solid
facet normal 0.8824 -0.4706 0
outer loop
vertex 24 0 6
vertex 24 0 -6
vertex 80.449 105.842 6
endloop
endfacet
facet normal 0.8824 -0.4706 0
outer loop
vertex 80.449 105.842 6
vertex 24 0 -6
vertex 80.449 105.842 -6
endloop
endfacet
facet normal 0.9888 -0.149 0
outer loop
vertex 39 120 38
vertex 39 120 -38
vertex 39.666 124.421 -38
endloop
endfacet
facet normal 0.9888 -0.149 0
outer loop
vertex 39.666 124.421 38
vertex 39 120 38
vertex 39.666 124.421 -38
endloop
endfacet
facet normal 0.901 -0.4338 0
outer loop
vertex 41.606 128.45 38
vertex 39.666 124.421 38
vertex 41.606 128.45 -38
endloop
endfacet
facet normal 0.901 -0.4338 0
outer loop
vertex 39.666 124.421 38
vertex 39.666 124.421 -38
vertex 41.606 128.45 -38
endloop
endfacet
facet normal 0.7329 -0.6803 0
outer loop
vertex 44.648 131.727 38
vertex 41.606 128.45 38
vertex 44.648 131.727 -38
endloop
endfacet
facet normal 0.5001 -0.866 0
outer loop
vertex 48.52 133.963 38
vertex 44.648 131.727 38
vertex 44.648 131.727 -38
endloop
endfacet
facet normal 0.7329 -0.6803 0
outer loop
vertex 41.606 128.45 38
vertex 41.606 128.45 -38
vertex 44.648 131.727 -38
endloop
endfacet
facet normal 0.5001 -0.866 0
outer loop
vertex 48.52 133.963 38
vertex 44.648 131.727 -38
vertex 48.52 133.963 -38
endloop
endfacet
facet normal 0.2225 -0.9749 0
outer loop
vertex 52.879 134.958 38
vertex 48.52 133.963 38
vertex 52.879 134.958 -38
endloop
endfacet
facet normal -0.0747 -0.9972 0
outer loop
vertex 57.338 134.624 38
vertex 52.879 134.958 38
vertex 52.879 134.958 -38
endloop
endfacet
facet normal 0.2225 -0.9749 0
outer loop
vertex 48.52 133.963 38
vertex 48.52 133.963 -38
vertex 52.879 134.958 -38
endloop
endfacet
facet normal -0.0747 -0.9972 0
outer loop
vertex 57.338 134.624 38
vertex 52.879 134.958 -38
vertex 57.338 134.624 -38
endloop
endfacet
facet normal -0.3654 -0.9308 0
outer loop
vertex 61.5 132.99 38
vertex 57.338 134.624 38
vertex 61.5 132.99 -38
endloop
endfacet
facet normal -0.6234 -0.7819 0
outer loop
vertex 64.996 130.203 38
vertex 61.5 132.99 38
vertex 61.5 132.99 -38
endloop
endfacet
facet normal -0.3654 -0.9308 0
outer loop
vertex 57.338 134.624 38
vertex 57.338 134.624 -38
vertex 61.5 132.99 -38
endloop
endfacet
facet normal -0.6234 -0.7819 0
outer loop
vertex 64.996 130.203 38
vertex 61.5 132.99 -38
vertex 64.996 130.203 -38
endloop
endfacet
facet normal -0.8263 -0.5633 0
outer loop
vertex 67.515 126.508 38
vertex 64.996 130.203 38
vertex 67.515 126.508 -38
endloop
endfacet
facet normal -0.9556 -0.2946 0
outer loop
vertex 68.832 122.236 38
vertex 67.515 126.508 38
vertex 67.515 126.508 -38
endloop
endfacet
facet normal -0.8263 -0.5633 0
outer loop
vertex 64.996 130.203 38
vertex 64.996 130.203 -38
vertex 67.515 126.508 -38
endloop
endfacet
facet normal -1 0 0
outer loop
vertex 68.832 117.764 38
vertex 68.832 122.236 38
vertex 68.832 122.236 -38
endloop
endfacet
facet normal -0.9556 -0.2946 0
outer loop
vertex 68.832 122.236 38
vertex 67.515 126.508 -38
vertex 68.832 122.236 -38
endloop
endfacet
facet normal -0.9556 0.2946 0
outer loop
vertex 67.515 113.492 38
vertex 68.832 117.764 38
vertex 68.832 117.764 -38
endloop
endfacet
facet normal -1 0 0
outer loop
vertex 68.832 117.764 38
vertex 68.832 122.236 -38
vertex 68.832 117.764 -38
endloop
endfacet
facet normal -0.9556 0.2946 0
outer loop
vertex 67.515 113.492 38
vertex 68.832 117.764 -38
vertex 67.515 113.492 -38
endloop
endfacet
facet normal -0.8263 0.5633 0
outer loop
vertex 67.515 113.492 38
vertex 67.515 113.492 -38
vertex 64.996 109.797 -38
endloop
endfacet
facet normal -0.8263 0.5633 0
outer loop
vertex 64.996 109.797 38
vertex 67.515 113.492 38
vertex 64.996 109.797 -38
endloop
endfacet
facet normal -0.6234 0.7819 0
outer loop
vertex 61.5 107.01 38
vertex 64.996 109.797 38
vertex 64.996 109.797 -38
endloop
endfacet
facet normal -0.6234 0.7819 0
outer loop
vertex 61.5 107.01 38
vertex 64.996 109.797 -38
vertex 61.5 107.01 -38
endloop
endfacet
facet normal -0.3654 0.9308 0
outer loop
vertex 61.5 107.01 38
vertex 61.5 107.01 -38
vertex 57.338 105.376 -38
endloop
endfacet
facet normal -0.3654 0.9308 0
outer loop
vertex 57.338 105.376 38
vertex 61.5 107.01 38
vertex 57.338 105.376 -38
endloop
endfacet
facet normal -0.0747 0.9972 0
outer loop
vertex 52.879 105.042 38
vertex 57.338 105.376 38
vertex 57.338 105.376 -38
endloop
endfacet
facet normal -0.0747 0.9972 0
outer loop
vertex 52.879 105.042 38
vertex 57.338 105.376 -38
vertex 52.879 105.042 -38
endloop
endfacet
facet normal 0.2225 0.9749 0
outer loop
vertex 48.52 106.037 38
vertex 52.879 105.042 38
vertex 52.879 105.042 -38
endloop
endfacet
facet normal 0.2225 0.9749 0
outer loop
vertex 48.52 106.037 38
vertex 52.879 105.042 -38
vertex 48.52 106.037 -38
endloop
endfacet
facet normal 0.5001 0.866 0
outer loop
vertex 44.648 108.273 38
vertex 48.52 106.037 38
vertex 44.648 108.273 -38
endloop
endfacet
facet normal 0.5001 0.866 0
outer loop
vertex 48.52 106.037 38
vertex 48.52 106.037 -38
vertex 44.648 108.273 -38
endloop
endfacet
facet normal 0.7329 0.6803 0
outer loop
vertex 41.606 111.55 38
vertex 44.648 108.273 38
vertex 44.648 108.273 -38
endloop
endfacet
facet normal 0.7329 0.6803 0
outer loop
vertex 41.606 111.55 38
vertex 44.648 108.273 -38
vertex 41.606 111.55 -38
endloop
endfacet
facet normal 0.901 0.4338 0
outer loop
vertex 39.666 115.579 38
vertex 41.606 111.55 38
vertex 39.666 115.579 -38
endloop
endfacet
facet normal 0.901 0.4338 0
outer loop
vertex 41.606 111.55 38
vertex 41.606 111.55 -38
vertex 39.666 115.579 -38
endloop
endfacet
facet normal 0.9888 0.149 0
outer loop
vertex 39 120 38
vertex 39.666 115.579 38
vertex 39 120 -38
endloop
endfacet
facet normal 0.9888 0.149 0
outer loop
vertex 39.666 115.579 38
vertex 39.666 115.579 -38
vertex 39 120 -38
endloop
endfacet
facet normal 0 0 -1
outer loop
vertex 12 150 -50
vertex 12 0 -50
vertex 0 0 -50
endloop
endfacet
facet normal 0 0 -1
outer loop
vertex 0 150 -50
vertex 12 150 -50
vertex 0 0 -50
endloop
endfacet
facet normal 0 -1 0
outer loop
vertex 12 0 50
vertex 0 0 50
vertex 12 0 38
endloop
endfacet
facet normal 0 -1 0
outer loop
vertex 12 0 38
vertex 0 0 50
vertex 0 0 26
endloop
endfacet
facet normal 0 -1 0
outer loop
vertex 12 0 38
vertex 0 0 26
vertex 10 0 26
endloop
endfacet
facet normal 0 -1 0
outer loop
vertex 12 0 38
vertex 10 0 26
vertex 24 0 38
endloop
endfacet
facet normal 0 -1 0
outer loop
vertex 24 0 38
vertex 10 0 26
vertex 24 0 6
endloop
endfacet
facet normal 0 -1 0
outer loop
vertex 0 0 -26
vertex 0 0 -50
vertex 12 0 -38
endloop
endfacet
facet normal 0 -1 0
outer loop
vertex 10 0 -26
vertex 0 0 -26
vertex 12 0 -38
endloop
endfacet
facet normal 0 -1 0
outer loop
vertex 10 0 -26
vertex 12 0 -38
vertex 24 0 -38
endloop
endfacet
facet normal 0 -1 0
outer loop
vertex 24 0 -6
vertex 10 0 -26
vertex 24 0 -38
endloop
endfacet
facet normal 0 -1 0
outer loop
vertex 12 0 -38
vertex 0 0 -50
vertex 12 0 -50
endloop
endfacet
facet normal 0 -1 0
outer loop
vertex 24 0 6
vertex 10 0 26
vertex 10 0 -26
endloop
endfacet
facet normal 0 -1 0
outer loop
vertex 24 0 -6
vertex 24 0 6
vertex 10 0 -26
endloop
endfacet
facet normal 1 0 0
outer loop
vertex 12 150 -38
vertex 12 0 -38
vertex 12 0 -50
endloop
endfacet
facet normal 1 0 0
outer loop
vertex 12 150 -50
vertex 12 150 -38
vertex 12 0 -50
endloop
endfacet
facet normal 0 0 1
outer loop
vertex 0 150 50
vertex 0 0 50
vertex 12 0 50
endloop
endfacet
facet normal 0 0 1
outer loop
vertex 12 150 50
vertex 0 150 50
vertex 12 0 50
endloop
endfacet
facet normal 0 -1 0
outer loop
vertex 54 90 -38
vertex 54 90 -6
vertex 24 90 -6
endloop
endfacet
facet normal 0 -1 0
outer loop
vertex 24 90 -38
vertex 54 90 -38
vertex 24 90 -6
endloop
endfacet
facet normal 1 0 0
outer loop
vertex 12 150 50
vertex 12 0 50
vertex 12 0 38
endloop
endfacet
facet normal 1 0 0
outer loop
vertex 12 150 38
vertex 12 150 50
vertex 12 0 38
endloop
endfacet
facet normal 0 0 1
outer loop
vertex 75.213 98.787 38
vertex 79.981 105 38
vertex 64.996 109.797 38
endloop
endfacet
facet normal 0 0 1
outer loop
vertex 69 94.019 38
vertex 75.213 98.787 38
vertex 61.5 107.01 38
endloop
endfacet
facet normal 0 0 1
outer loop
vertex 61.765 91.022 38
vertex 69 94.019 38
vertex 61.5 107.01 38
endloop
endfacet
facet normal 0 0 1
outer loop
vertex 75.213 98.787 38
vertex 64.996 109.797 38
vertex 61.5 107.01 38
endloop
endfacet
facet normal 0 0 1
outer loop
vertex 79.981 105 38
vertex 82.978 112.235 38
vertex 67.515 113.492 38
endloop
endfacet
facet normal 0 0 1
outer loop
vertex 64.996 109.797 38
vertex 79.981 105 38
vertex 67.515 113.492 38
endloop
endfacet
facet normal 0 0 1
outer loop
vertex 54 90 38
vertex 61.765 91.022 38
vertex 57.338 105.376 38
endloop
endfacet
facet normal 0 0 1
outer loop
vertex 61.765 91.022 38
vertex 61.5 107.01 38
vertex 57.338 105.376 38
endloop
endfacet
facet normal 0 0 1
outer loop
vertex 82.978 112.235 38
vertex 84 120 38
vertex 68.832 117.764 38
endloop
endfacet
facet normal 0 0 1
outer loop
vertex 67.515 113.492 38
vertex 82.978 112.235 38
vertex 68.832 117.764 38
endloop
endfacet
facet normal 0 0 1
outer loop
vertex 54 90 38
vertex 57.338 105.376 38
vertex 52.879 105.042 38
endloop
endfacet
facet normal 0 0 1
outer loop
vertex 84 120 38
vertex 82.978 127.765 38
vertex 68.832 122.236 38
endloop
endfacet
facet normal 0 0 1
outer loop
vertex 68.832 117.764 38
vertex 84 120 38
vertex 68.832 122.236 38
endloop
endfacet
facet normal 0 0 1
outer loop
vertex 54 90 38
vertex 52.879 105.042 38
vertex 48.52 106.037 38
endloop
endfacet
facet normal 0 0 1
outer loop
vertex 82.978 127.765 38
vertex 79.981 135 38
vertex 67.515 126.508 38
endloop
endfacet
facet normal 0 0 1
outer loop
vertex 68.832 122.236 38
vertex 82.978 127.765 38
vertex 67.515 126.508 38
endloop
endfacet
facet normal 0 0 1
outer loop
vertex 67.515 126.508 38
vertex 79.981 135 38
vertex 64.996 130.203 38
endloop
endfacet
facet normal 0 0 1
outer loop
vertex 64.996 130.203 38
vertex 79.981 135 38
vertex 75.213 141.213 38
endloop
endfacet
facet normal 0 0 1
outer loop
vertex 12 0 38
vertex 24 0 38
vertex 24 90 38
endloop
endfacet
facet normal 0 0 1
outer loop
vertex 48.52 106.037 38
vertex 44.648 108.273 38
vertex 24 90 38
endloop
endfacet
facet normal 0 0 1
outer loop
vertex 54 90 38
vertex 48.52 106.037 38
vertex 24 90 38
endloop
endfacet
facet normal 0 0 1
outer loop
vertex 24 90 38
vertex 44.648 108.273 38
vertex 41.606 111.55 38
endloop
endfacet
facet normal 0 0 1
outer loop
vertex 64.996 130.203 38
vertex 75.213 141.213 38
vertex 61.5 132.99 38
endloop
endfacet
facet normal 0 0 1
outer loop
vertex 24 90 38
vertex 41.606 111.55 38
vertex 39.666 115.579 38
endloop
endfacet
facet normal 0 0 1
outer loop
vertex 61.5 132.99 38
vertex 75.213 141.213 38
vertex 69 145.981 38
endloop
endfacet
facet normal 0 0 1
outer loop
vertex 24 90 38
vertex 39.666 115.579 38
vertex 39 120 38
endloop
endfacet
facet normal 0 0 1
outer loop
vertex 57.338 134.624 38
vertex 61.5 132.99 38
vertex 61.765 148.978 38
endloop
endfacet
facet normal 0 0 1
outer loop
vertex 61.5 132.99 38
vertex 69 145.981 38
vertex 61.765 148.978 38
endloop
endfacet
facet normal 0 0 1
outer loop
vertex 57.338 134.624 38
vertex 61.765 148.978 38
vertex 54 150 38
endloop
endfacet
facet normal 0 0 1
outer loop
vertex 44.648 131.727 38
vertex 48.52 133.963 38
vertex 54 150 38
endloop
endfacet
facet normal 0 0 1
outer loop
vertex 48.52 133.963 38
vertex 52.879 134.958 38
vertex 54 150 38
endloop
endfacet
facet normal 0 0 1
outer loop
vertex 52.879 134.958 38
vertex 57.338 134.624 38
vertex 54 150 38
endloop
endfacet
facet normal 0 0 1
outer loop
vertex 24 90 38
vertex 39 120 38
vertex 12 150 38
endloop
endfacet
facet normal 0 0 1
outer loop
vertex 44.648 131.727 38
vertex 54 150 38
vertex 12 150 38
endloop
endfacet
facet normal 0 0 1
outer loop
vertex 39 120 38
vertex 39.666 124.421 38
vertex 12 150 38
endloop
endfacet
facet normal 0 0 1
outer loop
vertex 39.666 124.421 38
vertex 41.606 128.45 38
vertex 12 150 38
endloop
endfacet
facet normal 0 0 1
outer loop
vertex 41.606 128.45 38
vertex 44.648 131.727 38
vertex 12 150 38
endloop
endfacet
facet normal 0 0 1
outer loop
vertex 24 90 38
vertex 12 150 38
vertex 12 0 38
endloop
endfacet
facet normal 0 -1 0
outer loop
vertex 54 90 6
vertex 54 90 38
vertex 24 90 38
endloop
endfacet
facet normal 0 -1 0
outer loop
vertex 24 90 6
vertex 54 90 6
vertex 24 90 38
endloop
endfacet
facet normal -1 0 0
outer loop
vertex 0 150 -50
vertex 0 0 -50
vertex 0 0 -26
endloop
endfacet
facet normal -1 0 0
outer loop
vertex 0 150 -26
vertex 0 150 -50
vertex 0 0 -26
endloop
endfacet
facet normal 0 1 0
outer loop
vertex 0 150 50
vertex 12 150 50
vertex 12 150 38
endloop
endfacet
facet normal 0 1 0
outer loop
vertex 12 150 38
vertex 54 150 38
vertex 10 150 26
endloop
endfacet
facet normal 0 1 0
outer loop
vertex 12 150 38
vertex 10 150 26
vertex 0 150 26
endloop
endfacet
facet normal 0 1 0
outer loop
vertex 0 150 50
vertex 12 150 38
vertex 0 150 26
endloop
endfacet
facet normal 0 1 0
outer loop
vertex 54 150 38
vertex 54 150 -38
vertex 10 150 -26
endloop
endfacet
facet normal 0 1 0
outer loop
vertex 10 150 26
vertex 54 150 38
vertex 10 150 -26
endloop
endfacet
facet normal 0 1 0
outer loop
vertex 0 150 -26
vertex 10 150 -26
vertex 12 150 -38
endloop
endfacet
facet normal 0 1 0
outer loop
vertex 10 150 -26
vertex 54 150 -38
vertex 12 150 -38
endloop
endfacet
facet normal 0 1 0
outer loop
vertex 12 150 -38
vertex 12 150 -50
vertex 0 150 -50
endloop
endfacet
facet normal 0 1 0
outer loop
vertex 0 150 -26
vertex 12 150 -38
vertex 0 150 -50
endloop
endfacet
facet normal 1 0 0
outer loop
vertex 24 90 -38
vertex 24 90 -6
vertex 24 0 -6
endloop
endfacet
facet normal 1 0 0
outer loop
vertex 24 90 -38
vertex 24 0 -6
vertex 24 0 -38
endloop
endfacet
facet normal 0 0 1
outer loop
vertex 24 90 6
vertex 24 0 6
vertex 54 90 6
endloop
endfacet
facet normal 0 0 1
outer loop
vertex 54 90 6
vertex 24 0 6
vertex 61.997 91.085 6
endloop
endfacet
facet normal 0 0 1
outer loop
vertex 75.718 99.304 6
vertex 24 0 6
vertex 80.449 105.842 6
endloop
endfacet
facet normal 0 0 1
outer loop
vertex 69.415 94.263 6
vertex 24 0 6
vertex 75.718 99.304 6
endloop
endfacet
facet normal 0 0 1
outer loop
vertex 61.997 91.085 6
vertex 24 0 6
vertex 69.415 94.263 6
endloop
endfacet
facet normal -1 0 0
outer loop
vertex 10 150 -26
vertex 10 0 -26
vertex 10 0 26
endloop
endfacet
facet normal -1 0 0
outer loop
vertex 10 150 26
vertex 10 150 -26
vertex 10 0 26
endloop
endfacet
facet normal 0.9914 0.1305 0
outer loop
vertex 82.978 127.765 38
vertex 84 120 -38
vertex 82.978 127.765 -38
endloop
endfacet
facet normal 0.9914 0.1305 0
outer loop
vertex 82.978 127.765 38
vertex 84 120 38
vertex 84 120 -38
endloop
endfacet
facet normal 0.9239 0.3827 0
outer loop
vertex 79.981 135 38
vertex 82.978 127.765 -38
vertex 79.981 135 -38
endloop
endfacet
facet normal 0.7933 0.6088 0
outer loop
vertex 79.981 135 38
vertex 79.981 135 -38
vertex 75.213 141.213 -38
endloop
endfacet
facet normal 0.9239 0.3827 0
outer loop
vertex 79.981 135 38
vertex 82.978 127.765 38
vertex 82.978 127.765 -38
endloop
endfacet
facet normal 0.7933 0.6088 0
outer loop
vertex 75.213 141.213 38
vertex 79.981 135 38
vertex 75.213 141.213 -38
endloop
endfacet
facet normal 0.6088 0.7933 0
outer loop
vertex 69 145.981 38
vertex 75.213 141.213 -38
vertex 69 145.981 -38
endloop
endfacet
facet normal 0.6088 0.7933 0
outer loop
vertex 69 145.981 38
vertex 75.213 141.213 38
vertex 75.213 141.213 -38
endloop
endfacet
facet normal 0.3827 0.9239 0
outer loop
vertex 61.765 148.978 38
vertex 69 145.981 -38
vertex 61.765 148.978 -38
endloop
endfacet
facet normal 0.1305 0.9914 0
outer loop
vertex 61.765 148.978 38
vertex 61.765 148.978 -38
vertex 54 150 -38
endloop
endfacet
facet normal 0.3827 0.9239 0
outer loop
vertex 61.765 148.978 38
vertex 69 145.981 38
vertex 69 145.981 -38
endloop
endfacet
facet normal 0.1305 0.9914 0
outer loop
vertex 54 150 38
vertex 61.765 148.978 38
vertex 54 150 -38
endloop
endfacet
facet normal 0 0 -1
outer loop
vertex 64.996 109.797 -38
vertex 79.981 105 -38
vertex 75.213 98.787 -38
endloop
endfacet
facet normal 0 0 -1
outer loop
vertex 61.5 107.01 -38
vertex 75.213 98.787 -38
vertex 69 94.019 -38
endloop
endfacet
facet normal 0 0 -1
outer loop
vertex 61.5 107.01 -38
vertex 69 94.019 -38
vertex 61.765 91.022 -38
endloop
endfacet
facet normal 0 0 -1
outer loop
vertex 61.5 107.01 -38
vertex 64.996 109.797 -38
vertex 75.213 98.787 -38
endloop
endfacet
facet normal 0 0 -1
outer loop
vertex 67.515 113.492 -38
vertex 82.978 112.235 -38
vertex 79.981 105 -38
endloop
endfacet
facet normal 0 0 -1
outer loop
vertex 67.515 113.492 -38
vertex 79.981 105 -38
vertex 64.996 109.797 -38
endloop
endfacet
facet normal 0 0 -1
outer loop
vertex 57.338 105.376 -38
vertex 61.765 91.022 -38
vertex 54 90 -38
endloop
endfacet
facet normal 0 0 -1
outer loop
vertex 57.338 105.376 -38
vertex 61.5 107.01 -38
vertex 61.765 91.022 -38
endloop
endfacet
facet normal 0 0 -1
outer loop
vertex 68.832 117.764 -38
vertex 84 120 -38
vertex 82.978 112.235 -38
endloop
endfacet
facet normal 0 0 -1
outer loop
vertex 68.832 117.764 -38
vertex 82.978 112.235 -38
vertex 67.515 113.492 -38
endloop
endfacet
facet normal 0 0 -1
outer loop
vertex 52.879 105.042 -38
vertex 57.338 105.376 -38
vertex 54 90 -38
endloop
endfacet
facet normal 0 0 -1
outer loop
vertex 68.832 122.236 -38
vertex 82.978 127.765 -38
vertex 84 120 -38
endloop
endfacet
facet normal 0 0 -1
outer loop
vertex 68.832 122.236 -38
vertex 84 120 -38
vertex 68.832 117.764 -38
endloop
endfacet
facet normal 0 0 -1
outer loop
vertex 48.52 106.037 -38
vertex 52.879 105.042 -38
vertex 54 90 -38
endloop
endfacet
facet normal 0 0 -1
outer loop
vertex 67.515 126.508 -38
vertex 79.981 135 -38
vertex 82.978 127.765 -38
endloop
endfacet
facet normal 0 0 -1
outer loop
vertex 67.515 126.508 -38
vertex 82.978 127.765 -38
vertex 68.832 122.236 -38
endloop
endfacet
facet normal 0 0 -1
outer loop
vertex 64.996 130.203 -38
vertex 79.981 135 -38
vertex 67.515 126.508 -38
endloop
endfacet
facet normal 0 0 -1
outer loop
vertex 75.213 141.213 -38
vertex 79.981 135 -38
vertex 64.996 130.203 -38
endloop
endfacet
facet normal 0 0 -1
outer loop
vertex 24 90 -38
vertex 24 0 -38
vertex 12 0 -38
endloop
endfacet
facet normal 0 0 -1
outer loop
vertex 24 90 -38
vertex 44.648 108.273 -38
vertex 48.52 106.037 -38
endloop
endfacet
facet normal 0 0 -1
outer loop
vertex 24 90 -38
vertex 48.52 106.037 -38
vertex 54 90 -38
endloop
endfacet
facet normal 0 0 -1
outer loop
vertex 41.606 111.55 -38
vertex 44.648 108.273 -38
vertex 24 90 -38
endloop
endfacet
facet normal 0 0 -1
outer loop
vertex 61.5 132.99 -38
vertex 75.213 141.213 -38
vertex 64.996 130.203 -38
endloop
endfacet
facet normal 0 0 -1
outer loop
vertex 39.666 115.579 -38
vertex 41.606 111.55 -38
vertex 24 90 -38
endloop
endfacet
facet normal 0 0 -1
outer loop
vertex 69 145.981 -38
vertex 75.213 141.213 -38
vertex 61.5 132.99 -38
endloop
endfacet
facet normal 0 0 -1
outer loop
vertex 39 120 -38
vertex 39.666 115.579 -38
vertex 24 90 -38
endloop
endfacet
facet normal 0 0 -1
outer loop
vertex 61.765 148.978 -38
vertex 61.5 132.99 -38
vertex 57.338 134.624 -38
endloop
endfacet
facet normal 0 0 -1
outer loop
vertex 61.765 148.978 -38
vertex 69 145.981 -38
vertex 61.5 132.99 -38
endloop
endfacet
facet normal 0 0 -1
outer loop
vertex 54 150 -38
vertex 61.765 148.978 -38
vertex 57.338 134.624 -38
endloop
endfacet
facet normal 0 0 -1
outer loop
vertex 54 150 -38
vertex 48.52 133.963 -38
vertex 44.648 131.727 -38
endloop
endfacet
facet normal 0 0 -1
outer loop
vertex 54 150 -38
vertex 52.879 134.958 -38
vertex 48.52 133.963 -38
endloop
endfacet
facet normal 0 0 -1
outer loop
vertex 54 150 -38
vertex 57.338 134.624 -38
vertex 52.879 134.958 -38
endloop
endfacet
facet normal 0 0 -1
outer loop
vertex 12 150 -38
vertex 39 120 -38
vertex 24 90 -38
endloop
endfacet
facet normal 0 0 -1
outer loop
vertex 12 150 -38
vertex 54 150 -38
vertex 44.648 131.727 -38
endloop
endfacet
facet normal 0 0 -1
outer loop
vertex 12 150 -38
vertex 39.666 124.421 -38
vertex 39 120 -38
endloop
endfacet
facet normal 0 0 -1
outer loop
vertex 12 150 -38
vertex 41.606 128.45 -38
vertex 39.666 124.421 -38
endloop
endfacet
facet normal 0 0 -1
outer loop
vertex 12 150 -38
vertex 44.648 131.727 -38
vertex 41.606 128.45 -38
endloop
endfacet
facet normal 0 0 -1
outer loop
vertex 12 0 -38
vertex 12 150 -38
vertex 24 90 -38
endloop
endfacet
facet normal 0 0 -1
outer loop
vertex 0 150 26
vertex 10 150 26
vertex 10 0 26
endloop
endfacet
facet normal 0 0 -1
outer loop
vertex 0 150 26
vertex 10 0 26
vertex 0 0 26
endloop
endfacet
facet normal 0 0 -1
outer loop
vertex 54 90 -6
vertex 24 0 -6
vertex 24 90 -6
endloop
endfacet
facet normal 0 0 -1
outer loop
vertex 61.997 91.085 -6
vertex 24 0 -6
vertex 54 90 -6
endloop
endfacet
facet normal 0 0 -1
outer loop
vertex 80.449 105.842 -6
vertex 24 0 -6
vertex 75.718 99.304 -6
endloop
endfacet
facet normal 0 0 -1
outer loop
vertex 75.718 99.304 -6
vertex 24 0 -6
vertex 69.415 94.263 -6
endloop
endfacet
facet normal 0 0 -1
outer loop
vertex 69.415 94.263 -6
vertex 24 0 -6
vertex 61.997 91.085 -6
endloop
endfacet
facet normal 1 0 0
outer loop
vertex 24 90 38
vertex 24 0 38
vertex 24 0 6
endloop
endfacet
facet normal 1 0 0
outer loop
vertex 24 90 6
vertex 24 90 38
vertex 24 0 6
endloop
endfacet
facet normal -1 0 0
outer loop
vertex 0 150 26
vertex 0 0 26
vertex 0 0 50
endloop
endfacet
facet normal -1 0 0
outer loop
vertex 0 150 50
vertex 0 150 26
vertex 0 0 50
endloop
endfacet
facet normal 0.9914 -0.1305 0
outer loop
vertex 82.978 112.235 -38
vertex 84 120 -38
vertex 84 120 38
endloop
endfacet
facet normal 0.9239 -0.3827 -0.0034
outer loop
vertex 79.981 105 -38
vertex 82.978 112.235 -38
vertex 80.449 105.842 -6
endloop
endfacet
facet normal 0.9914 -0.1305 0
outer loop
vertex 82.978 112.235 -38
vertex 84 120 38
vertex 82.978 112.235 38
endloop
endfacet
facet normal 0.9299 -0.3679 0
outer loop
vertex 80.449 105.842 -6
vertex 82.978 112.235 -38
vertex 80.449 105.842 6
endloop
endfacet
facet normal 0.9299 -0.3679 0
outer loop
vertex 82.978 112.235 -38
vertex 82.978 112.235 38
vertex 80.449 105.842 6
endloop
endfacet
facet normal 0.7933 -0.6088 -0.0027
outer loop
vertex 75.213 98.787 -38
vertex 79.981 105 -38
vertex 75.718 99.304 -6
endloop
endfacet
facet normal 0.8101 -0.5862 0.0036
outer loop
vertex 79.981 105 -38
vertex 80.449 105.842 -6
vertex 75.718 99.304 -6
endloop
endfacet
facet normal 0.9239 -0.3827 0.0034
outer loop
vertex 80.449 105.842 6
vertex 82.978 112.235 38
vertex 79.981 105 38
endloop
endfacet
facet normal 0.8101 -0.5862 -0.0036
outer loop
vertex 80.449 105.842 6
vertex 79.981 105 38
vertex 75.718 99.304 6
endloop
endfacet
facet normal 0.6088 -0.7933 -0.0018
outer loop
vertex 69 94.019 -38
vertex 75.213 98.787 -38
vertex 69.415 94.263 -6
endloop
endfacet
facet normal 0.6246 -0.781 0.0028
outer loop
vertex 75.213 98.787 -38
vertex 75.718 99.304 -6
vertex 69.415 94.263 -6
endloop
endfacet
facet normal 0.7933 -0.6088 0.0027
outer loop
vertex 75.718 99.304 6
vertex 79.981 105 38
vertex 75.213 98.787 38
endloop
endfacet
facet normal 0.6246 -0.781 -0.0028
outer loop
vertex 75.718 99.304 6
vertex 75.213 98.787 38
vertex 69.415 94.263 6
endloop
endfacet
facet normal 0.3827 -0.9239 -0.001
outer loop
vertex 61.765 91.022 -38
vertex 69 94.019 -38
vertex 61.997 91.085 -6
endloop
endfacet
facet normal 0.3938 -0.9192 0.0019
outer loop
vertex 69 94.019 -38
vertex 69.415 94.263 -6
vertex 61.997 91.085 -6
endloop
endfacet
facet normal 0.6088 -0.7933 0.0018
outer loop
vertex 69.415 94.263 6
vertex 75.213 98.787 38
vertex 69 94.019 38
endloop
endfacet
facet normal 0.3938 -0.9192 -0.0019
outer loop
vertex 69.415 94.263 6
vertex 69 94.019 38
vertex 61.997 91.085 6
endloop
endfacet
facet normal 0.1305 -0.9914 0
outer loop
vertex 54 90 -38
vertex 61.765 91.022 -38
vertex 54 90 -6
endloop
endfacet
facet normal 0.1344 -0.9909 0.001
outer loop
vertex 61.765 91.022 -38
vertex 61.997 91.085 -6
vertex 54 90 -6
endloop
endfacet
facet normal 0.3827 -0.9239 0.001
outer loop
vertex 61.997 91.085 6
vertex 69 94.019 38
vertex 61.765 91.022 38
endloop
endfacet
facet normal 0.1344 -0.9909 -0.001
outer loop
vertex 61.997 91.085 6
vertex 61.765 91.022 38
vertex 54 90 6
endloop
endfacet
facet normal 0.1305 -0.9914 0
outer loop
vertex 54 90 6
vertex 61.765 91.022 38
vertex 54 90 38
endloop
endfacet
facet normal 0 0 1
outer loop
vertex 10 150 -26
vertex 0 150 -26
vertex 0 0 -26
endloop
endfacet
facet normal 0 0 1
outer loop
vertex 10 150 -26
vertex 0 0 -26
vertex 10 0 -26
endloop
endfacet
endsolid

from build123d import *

# Parameters (mm, degrees)
BOSS_EXTRUDE1_DEPTH = 150
SKETCH2_W           = 60
SKETCH2_H           = 60
SKETCH2_R           = 15
BOSS_EXTRUDE2_DEPTH = 76
FILLET1_R           = 30
RIB4_REACH          = 181.042
SKETCH5_WALL_W      = 480.08378995
SKETCH5_WALL_H      = 12


with BuildPart() as part:
    # Sketch1 → Boss-Extrude1 (new body)
    with BuildSketch(Plane(origin=(0, 0, 0), x_dir=(1, 0, 0), z_dir=(0, 1, 0))):
        Polygon((0, 50), (0, 26), (10, 26), (10, -26), (0, -26), (0, -50), (12, -50), (12, -38), (24, -38), (24, 38), (12, 38), (12, 50), align=None)
    extrude(amount=BOSS_EXTRUDE1_DEPTH)

    # Sketch2 → Boss-Extrude2 (add)
    with BuildSketch(Plane(origin=(0, 0, -38), x_dir=(-1, 0, 0), z_dir=(0, 0, -1))):
        with Locations((-54, 120)):
            Rectangle(SKETCH2_W, SKETCH2_H)
        with Locations((-54, 120)):
            Circle(SKETCH2_R, mode=Mode.SUBTRACT)
    extrude(amount=-BOSS_EXTRUDE2_DEPTH)

    # Fillet1
    fillet1_edges = [part.edges().sort_by_distance(p)[0] for p in [
        (84, 150, 0),
        (84, 90, 0),
    ]]
    fillet(fillet1_edges, radius=FILLET1_R - 0.0001)  # a hair under: the kernel refuses the full size

    # Sketch5 wall → Rib4 (add, up to next)
    with BuildSketch(Plane(origin=(52.235294323, 52.941176856, 0), x_dir=(0.470588235292, 0.882352941178, 0), z_dir=(-0.882352941178, 0.470588235292, 0)), mode=Mode.PRIVATE) as rib4_sk1:
        Rectangle(SKETCH5_WALL_W, SKETCH5_WALL_H)
    rib4_tool1 = extrude(rib4_sk1.sketch, amount=RIB4_REACH, mode=Mode.PRIVATE) - part.part
    add(rib4_tool1.solids().sort_by_distance((52.235294323, 52.941176856, 0))[0])


solid = part.part
